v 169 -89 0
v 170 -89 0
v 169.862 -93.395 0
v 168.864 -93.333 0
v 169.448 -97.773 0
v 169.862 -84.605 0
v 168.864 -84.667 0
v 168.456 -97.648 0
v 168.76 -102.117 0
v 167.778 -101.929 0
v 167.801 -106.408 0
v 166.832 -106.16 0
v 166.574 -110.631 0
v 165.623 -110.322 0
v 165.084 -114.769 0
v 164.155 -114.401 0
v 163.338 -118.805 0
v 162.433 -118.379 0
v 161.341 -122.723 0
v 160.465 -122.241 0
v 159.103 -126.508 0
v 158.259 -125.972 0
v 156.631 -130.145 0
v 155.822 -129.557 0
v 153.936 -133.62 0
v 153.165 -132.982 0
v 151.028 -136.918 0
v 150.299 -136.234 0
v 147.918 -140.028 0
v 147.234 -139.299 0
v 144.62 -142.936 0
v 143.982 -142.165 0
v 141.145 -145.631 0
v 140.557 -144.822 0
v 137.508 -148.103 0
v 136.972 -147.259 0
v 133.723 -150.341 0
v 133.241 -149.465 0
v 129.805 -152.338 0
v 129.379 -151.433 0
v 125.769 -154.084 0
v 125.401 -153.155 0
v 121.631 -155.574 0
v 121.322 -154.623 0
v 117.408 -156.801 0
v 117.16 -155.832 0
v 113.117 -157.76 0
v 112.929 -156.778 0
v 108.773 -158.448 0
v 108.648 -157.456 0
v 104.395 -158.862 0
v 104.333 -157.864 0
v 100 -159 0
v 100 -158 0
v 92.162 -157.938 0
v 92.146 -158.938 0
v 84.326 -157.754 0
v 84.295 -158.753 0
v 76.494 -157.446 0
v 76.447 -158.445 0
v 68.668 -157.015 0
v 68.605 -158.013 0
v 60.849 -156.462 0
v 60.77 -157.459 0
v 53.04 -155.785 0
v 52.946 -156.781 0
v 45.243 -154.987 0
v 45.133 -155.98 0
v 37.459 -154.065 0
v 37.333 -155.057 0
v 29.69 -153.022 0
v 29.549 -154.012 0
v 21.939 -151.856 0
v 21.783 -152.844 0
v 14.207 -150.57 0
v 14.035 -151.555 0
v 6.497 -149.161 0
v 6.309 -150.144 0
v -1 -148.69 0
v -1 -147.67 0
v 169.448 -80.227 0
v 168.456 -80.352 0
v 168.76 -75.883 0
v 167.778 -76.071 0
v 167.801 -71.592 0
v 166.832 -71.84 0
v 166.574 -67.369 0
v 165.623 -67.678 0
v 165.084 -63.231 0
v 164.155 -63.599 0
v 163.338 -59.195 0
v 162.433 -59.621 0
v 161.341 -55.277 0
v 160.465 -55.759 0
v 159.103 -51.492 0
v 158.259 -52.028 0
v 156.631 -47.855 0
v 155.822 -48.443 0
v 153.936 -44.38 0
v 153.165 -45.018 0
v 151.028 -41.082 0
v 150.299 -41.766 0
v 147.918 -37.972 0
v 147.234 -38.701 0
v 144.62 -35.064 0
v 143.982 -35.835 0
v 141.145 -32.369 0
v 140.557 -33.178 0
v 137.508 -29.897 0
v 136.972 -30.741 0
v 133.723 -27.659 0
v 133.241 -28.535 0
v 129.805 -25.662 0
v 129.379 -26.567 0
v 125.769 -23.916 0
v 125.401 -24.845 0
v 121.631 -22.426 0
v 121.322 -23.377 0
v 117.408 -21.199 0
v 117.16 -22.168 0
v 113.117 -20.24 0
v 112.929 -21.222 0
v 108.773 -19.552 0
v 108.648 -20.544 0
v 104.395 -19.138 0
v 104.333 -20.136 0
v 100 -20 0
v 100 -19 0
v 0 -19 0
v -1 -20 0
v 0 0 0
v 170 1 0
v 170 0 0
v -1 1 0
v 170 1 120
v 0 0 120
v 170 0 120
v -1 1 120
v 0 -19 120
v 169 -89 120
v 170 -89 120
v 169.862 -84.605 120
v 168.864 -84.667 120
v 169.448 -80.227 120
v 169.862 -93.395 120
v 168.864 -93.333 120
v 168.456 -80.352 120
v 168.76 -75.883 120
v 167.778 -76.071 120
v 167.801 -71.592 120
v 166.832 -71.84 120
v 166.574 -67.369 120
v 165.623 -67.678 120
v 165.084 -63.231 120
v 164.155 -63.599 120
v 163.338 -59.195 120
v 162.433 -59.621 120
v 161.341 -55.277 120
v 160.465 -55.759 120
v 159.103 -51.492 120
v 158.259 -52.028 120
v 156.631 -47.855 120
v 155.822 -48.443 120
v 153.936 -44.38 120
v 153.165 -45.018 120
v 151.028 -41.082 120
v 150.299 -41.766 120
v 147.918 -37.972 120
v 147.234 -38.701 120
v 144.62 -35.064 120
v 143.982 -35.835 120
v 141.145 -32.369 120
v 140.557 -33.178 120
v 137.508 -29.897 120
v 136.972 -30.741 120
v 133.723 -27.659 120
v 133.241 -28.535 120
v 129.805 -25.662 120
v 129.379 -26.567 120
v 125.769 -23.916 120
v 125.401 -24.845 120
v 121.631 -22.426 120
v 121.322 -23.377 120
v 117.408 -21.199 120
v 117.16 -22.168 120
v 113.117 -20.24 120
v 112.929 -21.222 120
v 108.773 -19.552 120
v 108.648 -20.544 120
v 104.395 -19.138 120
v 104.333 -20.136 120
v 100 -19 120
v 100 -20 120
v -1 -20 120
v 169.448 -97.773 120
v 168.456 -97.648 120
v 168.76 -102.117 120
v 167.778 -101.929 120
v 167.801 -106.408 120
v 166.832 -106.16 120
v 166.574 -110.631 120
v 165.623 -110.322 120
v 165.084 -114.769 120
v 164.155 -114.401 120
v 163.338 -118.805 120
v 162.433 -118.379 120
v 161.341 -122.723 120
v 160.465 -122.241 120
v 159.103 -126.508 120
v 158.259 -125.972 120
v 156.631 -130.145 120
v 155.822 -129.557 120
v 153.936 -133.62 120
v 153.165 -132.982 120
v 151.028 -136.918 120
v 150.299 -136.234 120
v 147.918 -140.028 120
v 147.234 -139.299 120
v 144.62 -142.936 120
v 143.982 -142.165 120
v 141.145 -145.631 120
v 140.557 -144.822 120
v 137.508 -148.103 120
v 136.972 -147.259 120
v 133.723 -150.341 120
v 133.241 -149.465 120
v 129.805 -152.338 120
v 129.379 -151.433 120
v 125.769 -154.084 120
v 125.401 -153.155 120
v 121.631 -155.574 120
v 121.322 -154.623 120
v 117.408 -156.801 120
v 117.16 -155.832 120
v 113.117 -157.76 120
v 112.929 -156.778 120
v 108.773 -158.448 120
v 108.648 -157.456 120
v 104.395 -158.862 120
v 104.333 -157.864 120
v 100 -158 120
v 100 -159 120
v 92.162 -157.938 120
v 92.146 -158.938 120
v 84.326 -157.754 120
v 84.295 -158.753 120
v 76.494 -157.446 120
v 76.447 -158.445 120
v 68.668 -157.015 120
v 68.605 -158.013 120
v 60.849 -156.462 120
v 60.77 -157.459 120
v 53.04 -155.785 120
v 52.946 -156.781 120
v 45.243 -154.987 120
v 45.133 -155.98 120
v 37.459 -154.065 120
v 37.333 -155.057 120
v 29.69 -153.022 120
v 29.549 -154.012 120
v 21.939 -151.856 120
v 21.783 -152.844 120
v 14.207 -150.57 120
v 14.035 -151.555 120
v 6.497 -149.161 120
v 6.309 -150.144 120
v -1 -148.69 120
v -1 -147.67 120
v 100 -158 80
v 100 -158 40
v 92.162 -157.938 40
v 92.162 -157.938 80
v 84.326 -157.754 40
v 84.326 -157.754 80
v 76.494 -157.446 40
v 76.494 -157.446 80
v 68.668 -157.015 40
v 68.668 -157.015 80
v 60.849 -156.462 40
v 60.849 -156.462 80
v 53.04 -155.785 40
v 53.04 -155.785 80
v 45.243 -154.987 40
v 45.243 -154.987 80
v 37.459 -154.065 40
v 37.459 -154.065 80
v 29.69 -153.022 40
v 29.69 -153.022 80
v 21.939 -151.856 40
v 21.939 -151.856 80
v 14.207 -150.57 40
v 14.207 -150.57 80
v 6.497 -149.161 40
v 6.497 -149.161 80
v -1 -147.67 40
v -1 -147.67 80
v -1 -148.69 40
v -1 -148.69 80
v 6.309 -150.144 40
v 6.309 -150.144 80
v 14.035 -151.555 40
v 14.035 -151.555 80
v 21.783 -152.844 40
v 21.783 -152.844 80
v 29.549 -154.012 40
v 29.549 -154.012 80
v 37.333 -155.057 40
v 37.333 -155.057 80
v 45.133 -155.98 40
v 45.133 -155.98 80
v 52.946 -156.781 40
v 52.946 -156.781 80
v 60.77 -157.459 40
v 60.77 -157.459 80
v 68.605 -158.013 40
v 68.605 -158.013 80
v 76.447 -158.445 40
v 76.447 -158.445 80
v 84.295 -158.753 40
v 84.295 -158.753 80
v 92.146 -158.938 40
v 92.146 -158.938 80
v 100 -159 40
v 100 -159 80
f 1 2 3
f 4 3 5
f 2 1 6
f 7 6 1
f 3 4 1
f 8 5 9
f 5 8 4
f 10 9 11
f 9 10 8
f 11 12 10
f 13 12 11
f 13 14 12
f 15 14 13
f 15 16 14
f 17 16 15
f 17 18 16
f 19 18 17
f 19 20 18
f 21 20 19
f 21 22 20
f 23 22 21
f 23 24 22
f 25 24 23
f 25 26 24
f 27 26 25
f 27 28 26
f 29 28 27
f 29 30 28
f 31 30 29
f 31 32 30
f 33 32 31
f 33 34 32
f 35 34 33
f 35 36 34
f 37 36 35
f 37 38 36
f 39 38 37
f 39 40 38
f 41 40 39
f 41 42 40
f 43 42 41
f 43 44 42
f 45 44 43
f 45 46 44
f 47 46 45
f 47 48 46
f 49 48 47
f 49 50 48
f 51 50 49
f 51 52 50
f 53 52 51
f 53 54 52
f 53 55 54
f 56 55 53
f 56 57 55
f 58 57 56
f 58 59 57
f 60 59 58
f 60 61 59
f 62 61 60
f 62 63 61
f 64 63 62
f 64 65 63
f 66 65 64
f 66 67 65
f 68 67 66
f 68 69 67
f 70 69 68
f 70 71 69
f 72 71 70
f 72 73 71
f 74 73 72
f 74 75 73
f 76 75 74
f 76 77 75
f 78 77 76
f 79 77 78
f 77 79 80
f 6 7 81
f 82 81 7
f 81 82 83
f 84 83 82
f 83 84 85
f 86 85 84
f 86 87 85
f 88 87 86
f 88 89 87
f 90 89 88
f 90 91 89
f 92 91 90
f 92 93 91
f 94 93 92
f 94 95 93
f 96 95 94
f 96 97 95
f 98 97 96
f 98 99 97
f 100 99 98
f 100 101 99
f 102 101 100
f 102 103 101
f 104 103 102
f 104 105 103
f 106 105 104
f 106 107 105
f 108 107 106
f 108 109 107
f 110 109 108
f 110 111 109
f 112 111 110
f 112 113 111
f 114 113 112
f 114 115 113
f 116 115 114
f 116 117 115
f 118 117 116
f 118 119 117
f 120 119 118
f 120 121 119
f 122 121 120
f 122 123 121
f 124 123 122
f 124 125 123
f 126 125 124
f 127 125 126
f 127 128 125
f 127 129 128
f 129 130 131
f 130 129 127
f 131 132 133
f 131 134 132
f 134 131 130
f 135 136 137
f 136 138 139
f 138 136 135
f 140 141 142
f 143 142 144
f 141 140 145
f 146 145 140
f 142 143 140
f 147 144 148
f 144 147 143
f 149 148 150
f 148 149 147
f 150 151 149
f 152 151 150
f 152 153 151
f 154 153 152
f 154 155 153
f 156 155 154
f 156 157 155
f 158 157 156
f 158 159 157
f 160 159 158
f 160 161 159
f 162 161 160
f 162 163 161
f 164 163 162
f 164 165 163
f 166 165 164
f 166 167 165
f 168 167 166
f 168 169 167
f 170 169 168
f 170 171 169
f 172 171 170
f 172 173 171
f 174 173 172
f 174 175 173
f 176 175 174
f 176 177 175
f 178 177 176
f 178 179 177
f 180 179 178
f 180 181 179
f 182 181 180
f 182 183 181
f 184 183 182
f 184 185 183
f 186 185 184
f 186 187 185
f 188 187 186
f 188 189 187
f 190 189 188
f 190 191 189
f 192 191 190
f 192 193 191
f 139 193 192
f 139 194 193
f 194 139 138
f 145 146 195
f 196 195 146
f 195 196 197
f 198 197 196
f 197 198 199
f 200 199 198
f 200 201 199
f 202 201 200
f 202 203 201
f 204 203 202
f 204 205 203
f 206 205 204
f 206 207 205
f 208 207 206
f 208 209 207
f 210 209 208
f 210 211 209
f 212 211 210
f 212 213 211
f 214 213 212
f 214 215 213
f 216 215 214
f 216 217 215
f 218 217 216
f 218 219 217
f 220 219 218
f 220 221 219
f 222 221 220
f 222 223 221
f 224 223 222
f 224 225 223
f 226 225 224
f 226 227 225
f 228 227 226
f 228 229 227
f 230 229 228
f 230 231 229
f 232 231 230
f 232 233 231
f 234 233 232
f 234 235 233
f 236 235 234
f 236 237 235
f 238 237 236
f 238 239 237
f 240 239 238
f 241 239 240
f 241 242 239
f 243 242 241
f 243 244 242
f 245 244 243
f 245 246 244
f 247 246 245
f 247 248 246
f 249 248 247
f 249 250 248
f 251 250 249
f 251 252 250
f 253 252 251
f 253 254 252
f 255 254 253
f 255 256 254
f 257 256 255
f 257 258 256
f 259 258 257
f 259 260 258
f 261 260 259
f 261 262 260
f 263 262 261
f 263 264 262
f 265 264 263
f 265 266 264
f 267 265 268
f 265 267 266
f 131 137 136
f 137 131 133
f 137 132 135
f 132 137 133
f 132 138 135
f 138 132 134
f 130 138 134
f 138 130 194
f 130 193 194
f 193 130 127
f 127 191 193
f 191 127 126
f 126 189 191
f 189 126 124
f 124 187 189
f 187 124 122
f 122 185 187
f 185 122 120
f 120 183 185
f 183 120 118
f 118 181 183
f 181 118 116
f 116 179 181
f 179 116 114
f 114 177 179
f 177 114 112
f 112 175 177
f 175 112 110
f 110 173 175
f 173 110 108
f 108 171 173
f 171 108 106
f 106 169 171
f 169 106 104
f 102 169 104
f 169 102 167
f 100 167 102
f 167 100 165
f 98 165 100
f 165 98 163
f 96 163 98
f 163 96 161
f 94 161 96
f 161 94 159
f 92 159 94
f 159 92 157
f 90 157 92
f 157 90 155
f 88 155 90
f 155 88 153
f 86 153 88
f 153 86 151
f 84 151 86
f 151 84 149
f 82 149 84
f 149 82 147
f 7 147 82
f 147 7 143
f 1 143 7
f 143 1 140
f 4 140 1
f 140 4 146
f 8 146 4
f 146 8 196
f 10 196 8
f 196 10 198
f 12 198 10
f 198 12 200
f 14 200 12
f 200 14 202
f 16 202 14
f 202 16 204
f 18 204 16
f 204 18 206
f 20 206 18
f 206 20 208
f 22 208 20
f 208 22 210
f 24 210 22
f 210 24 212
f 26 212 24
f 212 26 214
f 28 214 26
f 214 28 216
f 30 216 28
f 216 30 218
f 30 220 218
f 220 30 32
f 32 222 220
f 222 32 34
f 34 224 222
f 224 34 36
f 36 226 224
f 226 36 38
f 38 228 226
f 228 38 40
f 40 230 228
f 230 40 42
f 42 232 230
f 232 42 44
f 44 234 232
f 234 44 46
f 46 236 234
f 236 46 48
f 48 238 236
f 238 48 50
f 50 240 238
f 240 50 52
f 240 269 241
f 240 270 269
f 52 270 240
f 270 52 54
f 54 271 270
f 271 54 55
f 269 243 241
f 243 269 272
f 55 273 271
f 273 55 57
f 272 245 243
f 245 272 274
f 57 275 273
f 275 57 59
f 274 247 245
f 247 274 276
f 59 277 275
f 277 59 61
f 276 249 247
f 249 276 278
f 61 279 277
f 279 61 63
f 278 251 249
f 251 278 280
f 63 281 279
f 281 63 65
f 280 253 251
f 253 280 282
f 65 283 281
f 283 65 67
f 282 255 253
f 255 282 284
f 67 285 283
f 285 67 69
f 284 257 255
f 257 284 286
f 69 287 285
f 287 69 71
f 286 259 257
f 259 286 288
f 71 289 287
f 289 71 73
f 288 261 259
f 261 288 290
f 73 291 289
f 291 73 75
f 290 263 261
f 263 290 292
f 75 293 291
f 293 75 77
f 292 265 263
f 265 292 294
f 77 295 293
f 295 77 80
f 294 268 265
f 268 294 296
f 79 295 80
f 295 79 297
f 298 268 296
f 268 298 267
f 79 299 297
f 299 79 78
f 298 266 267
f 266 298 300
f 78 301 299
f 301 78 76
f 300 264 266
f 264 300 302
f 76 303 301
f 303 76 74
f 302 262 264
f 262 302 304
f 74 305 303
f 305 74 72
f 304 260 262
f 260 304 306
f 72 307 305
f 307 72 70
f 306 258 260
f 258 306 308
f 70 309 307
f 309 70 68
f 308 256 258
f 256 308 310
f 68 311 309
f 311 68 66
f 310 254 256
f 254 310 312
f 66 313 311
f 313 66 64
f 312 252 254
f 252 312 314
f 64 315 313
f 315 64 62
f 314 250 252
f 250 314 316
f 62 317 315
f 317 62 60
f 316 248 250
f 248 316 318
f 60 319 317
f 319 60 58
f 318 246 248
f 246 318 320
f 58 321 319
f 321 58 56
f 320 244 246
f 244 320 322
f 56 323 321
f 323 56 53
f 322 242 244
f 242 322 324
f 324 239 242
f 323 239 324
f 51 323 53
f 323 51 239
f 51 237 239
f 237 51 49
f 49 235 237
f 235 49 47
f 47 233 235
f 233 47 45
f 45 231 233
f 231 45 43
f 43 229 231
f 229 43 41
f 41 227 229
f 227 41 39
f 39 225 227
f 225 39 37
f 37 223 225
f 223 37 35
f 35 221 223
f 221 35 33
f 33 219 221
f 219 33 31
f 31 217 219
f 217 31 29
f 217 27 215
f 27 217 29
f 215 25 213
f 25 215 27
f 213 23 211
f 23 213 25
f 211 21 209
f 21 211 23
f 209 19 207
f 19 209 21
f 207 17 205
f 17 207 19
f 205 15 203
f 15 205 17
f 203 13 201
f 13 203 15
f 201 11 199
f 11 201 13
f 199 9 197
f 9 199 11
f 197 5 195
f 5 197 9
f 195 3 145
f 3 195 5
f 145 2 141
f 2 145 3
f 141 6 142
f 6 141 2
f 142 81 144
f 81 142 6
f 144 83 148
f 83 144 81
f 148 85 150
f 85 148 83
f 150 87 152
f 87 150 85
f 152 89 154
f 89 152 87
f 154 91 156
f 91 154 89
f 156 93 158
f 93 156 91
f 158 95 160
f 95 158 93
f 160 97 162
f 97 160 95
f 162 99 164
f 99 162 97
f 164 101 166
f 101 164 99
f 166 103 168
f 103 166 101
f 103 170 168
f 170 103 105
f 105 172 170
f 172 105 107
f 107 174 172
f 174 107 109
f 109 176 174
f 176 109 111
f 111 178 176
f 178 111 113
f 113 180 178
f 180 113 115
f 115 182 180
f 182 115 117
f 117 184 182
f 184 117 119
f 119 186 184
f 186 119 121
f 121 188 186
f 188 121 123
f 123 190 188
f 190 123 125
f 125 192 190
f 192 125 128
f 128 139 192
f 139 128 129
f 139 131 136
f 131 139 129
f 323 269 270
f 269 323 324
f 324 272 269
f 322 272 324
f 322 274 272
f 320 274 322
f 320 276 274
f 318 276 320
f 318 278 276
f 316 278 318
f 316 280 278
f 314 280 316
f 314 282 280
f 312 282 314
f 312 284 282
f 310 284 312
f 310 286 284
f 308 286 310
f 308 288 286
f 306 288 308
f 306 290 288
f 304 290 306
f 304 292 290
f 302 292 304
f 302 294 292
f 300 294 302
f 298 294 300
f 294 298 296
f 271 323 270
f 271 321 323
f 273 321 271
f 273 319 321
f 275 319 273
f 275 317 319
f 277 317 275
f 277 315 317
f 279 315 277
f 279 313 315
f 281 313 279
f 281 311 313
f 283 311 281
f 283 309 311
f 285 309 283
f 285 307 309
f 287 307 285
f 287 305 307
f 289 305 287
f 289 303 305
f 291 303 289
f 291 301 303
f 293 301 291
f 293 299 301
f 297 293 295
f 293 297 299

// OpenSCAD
shelf_thickness = 19;
width = 120;
hook_slit = 40;
length = 170;
backtrace_length = 100;
drop_radius = 70;
hook_radius = 500;
thickness = 1;

difference() {
  linear_extrude(height = width) {
    square([length, thickness]);
    translate([0, -shelf_thickness - thickness]) {
      rotate(90) {
        square([shelf_thickness + 2*thickness, thickness]);
      }
    }
    translate([backtrace_length, -shelf_thickness]) {
      rotate(180) {
        square([backtrace_length, thickness]);
      }
    }
    translate([backtrace_length, -shelf_thickness - drop_radius]) {
      rotate(180) {
        difference() {
          circle(r = drop_radius, $fn = 100);
          circle(r = drop_radius - thickness, $fn = 100);
          translate([0, -2*drop_radius]) {
            square([4*drop_radius, 4*drop_radius]);
          }
        }
      }
    }
    translate([backtrace_length, -shelf_thickness - 2*drop_radius + hook_radius]) {
      difference() {
        circle(r = hook_radius, $fn = 400);
        circle(r = hook_radius - thickness, $fn = 400);
        translate([0, -2*hook_radius]) {
          square([4*hook_radius, 4*hook_radius]);
        }
        translate([2*hook_radius, 0]) {
          rotate(90) {
            square([4*hook_radius, 4*hook_radius]);
          }
        }
        translate([-backtrace_length - thickness, 2*hook_radius]) {
          rotate(180) {
            square([4*hook_radius, 4*hook_radius]);
          }
        }
      }
    }
  }
  translate ([0, -shelf_thickness - 2*drop_radius, width/2]) {
    cube([2*backtrace_length, 2*drop_radius, hook_slit], center = true);
  }
}
